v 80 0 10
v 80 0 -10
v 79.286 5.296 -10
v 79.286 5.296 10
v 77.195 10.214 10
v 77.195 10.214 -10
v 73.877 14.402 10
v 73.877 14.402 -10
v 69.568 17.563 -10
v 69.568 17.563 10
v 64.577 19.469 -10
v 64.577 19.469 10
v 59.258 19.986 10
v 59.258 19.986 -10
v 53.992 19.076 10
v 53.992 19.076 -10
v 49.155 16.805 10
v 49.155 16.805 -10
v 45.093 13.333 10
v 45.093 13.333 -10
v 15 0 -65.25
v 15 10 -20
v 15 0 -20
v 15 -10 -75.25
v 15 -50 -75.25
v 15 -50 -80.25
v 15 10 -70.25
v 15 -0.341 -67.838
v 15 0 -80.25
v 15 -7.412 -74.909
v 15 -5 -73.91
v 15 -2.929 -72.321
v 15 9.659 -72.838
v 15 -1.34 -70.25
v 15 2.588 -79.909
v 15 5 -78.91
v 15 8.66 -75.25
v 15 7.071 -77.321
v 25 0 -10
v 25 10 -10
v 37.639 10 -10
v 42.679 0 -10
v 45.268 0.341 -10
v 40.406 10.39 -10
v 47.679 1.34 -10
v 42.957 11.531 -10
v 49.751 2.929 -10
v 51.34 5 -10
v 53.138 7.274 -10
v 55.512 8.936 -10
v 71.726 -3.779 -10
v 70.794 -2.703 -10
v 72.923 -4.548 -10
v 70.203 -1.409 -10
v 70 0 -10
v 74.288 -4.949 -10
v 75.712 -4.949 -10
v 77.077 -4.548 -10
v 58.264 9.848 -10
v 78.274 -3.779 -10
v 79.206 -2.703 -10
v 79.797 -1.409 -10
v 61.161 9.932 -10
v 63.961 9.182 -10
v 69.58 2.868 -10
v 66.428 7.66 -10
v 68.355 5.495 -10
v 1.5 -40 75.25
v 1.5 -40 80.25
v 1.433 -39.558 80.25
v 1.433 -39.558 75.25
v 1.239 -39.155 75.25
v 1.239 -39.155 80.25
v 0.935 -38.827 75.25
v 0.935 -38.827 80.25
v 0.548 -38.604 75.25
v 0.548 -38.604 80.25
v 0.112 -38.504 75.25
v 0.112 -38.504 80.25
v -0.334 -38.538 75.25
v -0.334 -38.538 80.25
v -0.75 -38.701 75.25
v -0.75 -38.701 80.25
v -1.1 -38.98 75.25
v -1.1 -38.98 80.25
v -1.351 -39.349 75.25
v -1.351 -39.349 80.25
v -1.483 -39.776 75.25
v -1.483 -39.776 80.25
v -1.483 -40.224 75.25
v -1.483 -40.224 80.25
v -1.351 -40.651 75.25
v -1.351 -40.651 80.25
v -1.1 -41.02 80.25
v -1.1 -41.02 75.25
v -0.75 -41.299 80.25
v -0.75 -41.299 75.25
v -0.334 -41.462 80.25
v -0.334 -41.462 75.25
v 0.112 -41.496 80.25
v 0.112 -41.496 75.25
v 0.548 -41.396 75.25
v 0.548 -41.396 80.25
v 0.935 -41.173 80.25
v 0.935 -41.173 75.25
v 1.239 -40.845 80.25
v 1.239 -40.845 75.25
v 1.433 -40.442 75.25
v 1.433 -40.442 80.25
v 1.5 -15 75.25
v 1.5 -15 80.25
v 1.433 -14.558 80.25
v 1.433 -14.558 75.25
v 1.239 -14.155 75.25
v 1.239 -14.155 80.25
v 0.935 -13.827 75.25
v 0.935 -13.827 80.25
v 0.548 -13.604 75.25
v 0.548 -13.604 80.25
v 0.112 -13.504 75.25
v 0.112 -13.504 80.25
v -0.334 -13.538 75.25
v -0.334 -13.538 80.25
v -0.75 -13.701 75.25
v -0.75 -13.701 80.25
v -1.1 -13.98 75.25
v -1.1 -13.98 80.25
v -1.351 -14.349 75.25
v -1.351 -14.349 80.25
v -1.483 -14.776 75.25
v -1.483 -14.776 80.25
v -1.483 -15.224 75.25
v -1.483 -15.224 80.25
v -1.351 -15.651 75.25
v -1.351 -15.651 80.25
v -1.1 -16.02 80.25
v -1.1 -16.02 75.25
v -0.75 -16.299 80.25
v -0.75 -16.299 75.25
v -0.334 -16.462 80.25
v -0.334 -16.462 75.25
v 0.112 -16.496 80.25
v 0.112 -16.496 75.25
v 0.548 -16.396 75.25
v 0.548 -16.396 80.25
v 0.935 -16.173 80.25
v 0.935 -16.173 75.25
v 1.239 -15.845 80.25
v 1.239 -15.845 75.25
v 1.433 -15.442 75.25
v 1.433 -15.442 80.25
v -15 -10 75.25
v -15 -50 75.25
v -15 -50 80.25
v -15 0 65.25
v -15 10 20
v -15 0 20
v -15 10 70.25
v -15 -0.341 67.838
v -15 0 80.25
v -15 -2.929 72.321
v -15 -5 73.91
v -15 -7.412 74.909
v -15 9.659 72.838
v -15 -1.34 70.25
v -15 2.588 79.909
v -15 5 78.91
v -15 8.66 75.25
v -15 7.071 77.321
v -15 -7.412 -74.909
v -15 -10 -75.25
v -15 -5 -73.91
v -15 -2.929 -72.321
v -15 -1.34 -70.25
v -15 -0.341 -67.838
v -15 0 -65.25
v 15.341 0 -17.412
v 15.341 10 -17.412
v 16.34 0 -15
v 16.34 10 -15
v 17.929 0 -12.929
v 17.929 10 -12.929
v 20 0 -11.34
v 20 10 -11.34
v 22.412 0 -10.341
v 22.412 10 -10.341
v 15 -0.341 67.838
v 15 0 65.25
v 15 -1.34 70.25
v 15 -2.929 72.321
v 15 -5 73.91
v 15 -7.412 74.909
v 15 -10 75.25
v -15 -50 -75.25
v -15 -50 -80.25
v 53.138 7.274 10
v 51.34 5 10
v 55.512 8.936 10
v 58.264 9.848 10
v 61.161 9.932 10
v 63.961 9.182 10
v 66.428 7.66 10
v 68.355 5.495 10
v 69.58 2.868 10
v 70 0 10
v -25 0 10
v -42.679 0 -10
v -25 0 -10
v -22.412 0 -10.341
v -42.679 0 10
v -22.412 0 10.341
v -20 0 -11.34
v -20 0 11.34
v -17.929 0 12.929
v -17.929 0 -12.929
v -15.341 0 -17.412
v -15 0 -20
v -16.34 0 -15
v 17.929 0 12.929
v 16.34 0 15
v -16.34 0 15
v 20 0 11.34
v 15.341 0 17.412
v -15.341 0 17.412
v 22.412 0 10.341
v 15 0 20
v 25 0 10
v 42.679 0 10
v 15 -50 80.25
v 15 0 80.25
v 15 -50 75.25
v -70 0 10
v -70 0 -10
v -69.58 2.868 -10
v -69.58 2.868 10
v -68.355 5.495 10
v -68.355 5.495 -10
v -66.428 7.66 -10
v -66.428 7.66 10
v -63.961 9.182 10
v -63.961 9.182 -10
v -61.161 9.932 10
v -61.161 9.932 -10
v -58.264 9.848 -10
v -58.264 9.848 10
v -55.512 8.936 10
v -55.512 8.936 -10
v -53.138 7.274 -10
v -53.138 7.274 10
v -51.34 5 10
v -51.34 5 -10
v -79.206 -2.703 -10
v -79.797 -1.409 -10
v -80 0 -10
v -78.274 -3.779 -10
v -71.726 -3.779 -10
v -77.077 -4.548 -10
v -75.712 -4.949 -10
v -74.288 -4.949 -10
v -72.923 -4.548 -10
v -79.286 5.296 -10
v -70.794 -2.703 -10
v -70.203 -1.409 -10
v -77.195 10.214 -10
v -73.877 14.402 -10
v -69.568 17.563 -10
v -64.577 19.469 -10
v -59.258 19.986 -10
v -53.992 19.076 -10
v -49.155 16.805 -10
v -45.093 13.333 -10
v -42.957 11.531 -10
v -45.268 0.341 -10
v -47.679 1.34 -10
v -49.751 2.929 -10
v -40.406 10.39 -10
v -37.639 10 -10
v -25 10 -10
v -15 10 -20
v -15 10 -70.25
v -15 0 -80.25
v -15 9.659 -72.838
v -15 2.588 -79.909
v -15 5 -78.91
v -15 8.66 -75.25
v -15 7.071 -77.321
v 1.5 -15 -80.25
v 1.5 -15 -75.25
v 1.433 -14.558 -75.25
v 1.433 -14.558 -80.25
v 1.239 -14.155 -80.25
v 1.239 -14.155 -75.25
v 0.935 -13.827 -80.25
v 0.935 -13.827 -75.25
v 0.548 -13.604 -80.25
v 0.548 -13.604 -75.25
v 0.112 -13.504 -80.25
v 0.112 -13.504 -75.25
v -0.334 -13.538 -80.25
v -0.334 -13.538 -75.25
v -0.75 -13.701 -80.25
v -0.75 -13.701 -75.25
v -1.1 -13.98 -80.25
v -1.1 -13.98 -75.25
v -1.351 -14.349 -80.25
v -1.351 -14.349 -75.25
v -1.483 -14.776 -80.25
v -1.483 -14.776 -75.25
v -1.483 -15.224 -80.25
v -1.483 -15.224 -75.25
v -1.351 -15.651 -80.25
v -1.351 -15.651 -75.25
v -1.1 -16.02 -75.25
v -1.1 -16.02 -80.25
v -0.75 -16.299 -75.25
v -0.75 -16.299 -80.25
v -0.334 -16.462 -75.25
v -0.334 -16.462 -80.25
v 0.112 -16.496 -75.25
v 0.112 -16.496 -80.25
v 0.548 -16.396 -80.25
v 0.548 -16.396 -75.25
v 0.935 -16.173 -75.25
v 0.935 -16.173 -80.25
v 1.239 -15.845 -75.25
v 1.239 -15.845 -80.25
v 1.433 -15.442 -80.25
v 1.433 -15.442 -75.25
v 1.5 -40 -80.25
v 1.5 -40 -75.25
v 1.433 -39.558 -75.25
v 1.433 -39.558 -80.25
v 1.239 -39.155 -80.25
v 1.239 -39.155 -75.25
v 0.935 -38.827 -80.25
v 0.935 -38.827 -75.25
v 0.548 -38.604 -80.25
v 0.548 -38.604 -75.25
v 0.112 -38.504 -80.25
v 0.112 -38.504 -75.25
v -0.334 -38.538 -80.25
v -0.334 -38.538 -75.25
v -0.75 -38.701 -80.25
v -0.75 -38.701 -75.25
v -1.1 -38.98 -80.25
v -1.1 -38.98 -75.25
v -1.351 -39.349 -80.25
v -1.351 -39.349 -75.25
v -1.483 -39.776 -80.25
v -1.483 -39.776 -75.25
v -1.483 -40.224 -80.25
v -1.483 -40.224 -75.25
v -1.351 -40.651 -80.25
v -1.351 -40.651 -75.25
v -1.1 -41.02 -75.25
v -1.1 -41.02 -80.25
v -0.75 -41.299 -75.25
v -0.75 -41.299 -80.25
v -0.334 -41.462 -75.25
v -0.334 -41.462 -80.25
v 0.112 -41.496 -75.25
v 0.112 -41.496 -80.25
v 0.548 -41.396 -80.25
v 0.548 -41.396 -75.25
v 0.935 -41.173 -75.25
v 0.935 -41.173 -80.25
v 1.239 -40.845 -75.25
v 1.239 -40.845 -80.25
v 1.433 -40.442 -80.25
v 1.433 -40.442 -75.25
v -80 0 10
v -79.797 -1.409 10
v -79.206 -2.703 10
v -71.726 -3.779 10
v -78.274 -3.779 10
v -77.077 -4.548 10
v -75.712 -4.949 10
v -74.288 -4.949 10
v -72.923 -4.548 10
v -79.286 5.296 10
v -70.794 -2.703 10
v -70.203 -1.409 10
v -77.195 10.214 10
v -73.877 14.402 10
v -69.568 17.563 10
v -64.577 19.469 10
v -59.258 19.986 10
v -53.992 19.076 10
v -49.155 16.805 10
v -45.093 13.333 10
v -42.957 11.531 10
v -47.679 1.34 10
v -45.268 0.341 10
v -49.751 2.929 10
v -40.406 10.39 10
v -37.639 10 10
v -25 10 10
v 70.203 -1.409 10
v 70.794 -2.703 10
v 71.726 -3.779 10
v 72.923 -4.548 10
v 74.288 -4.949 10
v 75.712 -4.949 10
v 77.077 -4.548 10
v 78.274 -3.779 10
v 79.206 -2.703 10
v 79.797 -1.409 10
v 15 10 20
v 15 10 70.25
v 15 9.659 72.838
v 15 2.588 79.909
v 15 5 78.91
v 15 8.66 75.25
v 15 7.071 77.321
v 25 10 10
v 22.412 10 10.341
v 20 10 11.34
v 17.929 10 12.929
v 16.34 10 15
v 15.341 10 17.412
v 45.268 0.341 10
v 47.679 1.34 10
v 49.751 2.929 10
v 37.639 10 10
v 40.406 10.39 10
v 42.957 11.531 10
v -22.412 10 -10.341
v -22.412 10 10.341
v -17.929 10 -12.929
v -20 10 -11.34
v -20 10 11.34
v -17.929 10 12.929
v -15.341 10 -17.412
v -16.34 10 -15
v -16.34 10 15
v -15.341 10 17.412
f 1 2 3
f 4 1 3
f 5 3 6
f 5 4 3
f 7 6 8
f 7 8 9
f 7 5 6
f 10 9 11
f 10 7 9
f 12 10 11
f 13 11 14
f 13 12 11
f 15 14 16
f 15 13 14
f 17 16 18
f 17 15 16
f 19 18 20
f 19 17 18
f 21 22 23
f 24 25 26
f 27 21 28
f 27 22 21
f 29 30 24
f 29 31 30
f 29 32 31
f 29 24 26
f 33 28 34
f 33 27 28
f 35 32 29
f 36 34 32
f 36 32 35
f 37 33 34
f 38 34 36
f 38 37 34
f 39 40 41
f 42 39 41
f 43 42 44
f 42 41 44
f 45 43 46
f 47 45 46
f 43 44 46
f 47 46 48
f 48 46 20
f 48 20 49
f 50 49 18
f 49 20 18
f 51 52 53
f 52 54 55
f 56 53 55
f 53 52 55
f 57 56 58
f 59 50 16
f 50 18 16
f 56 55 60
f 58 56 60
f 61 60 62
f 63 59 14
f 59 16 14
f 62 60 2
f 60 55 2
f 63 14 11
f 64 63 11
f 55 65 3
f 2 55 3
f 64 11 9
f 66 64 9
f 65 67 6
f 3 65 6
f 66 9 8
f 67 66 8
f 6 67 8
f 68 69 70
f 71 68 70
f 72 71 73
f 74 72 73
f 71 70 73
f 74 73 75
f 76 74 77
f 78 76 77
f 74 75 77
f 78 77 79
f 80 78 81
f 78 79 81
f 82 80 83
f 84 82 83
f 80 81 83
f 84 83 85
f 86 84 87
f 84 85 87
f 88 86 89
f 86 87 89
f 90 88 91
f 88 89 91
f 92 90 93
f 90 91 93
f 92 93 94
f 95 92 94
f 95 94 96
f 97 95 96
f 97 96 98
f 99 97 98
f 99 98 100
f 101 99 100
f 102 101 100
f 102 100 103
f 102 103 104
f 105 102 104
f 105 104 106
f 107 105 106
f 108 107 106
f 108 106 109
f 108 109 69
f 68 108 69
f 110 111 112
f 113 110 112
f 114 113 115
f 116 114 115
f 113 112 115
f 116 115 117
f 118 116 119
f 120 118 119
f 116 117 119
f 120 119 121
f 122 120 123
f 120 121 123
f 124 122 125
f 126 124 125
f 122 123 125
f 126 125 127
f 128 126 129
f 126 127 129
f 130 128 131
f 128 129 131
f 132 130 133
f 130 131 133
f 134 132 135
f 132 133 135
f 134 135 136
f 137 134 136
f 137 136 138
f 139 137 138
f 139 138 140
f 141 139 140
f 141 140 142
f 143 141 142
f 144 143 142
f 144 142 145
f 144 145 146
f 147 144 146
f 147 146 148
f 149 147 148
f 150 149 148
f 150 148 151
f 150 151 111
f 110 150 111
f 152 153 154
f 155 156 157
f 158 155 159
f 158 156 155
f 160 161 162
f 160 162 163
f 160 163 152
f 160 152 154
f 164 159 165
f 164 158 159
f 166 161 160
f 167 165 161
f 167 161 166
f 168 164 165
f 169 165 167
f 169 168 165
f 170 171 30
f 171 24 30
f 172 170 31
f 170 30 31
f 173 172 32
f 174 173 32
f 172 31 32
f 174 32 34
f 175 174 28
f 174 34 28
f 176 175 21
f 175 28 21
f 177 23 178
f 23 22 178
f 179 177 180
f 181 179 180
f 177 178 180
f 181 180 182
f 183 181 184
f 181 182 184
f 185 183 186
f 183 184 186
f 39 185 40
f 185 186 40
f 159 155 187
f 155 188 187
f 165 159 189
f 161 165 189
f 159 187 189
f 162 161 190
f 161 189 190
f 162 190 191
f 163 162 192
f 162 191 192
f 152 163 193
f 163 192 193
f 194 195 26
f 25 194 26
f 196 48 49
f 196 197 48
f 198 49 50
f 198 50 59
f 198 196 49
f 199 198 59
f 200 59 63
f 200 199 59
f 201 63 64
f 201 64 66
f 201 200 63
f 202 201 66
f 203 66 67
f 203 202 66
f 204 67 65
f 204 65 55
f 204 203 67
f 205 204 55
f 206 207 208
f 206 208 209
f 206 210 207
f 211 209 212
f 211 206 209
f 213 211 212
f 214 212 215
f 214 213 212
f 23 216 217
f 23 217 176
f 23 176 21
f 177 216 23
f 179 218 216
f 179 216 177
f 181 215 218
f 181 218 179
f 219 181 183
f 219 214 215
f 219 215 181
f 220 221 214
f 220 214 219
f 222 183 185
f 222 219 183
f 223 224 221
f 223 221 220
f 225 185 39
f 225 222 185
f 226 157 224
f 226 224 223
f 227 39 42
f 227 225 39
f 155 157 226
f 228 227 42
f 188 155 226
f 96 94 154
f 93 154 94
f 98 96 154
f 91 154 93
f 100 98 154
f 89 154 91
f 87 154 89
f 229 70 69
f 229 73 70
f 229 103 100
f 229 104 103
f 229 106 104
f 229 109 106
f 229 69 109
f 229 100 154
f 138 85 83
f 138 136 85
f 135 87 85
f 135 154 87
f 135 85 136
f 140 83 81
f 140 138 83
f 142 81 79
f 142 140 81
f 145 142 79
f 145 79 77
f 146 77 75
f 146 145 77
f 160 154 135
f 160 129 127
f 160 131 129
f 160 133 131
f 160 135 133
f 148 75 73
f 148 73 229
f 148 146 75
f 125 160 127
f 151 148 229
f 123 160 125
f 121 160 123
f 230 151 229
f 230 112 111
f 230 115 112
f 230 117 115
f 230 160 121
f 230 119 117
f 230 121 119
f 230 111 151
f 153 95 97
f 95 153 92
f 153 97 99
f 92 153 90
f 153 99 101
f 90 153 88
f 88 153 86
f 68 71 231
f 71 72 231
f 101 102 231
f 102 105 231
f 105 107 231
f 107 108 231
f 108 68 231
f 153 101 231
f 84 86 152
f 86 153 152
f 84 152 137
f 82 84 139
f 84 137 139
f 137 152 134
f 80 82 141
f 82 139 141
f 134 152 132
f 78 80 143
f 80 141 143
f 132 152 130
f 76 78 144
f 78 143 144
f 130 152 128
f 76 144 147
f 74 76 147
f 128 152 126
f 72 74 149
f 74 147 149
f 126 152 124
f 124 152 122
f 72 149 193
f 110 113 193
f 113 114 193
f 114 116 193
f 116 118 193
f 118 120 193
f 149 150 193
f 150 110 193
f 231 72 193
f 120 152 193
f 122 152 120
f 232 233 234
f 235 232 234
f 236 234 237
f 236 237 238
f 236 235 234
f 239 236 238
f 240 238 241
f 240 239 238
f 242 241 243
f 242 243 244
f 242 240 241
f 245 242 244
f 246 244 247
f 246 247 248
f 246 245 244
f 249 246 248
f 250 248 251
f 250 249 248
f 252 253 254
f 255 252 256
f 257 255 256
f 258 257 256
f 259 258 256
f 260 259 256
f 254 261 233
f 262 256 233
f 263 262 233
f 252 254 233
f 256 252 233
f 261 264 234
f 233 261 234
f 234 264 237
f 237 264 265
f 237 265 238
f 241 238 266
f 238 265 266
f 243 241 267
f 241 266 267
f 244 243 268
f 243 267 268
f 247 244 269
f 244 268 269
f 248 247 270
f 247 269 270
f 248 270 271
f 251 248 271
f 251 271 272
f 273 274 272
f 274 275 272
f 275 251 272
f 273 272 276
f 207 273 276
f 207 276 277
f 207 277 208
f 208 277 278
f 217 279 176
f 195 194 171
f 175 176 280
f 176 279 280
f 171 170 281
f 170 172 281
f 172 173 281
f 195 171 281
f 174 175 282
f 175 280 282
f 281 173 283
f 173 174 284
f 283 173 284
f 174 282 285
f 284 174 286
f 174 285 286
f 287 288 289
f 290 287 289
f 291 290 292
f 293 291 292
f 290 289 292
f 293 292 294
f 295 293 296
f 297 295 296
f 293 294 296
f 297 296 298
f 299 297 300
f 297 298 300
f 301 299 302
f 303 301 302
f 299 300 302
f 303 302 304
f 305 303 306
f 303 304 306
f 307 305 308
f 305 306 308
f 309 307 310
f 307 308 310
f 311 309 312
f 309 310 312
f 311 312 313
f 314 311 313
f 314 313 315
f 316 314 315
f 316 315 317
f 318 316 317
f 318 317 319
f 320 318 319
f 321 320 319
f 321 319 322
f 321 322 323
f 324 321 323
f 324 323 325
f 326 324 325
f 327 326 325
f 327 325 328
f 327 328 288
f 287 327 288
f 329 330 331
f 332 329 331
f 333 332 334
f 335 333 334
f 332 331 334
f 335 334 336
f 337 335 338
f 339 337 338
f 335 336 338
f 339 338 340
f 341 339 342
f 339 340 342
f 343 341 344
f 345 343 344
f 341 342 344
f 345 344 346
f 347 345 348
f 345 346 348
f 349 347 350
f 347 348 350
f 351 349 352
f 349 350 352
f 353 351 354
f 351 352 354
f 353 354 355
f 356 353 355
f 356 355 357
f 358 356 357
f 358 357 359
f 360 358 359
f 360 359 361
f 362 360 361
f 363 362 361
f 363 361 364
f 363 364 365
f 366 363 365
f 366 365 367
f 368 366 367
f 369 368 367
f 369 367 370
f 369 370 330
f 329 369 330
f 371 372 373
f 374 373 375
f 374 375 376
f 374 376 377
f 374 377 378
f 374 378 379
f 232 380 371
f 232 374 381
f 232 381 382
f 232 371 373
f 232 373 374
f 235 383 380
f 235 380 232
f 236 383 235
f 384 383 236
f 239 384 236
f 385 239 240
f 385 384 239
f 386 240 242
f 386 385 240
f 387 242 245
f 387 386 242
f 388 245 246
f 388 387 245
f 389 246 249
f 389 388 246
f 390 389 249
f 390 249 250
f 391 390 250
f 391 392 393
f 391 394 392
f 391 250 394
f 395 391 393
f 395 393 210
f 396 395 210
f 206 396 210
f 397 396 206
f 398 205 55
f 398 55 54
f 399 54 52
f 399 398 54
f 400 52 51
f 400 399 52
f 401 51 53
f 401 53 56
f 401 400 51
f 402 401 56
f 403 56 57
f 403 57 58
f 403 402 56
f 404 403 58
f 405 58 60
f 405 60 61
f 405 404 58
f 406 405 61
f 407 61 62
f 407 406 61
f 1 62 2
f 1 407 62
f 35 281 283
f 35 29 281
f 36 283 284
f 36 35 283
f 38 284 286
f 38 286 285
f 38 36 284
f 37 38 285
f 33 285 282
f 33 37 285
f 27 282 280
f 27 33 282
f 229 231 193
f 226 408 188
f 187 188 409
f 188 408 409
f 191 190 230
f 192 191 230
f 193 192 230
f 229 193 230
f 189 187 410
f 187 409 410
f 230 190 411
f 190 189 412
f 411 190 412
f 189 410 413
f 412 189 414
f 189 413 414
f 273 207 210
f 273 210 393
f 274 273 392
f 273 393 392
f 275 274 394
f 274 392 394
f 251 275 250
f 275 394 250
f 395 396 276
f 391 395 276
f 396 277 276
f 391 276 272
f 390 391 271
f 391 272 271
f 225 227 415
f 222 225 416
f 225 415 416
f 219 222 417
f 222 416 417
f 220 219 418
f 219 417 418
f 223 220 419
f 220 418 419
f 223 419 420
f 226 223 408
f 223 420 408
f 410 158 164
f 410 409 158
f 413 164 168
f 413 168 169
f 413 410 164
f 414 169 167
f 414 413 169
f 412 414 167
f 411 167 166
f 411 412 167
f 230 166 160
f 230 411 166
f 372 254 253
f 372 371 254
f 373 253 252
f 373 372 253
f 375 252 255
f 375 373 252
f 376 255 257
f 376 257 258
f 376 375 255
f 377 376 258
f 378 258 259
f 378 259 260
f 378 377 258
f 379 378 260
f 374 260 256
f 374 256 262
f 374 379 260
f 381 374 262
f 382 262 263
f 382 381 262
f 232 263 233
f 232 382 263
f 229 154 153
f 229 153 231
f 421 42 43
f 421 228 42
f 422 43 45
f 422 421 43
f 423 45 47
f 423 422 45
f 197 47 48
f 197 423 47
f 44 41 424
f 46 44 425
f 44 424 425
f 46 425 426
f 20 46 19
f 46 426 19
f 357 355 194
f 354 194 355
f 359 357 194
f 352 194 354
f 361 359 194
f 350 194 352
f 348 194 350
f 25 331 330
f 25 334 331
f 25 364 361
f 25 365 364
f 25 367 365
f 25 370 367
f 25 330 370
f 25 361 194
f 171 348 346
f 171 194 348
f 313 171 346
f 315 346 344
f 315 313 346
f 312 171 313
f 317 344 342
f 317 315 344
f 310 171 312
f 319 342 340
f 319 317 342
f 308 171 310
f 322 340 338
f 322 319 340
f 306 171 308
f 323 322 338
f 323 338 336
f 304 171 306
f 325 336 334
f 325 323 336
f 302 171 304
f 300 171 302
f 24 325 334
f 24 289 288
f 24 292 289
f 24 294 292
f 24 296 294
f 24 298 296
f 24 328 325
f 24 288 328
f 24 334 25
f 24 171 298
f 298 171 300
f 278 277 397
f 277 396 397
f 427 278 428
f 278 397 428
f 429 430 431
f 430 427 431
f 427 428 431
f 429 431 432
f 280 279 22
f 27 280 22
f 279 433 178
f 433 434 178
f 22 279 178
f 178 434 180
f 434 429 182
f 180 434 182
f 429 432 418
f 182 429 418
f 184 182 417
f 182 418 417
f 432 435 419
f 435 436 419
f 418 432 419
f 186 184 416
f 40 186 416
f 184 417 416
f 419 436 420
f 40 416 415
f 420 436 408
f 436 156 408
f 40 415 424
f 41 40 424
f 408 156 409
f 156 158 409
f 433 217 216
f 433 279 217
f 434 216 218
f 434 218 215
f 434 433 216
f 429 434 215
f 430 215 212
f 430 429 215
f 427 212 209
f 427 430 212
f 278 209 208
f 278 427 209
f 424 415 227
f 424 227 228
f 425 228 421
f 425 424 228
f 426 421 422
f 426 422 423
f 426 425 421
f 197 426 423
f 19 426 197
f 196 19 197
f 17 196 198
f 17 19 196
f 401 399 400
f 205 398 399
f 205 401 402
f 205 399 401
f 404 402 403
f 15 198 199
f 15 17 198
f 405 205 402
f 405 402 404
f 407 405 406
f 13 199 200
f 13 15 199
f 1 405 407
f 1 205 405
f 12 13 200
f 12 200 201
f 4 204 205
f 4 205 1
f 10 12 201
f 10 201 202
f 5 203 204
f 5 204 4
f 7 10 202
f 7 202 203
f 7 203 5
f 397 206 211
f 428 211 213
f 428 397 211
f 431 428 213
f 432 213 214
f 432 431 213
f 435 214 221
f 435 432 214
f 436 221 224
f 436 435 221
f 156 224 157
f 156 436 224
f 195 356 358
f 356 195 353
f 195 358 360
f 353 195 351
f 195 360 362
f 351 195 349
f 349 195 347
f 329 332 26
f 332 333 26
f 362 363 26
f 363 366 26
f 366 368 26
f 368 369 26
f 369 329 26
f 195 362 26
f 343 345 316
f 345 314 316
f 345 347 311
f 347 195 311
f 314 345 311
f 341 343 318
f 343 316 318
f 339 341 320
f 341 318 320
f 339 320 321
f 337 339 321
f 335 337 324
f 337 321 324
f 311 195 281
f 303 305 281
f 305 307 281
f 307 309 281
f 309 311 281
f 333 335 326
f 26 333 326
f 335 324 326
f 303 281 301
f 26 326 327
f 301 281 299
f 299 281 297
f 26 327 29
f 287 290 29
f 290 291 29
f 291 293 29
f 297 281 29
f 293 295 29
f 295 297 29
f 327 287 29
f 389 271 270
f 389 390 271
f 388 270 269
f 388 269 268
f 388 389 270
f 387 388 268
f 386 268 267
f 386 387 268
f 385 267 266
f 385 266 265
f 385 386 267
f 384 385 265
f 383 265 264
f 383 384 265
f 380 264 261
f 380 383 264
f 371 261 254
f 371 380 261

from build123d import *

# Parameters (mm, degrees)
BOSS_EXTRUDE1_DEPTH     = 10
SKETCH2_W               = 30
SKETCH2_H               = 160.5
BOSS_EXTRUDE2_DEPTH     = 10
SKETCH3_W               = 30
SKETCH3_H               = 5
BOSS_EXTRUDE3_DEPTH     = 50
SKETCH4_R               = 1.5
CUT_EXTRUDE1_DEPTH      = 1
CUT_EXTRUDE1_DEPTH_BACK = 161.5
FILLET1_R               = 10
FILLET2_R               = 10
FILLET3_R               = 10


with BuildPart() as part:
    # Sketch1 → Boss-Extrude1 (new body, symmetric)
    with BuildSketch(Plane.XY):
        with BuildLine():
            ThreePointArc((-70, 0), (-60, 10), (-50, 0))
            Line((-50, 0), (-40, 0))
            ThreePointArc((-40, 0), (-40.681483474, 5.176380902), (-42.679491924, 10))
            ThreePointArc((-42.679491924, 10), (-65.176380902, 19.318516526), (-80, 0))
            ThreePointArc((-80, 0), (-75, -5), (-70, 0))
        make_face()
        with BuildLine():
            ThreePointArc((-42.679491924, 10), (-40.681483474, 5.176380902), (-40, 0))
            Line((-40, 0), (40, 0))
            ThreePointArc((40, 0), (40.681483474, 5.176380902), (42.679491924, 10))
            Line((42.679491924, 10), (-42.679491924, 10))
        make_face()
        with BuildLine():
            ThreePointArc((42.679491924, 10), (40.681483474, 5.176380902), (40, 0))
            Line((40, 0), (50, 0))
            ThreePointArc((50, 0), (60, 10), (70, 0))
            ThreePointArc((70, 0), (75, -5), (80, 0))
            ThreePointArc((80, 0), (65.176380902, 19.318516526), (42.679491924, 10))
        make_face()
    extrude(amount=BOSS_EXTRUDE1_DEPTH, both=True)

    # Sketch2 → Boss-Extrude2 (add)
    with BuildSketch(Plane.XZ):
        Rectangle(SKETCH2_W, SKETCH2_H)
    extrude(amount=-BOSS_EXTRUDE2_DEPTH)

    # Sketch3 → Boss-Extrude3 (add)
    with BuildSketch(Plane.XZ):
        with Locations((0, 77.75)):
            Rectangle(SKETCH3_W, SKETCH3_H)
    boss_extrude3 = extrude(amount=BOSS_EXTRUDE3_DEPTH)

    # Mirror1: Boss-Extrude3 across plane
    add(boss_extrude3.mirror(Plane.XY))

    # Sketch4 → Cut-Extrude1 (cut, two sides)
    with BuildSketch(Plane.XY.offset(80.25)) as cut_extrude1_sk:
        with Locations((0, -40)):
            Circle(SKETCH4_R)
        with Locations((0, -15)):
            Circle(SKETCH4_R)
    extrude(amount=CUT_EXTRUDE1_DEPTH, mode=Mode.SUBTRACT)
    extrude(cut_extrude1_sk.sketch, amount=-CUT_EXTRUDE1_DEPTH_BACK, mode=Mode.SUBTRACT)

    # Fillet1
    fillet1_edges = [part.edges().sort_by_distance(p)[0] for p in [
        (0, 10, -80.25),
        (0, 10, 80.25),
        (0, 0, 75.25),
        (0, 0, -75.25),
    ]]
    fillet(fillet1_edges, radius=FILLET1_R)

    # Fillet2
    fillet2_edges = [part.edges().sort_by_distance(p)[0] for p in [
        (-15, 5, -10),
        (15, 5, -10),
        (15, 5, 10),
        (-15, 5, 10),
    ]]
    fillet(fillet2_edges, radius=FILLET2_R)

    # Fillet3
    fillet3_edges = [part.edges().sort_by_distance(p)[0] for p in [
        (-42.679491924, 10, 0),
        (42.679491924, 10, 0),
        (50, 0, 0),
        (-50, 0, 0),
    ]]
    fillet(fillet3_edges, radius=FILLET3_R)


solid = part.part
